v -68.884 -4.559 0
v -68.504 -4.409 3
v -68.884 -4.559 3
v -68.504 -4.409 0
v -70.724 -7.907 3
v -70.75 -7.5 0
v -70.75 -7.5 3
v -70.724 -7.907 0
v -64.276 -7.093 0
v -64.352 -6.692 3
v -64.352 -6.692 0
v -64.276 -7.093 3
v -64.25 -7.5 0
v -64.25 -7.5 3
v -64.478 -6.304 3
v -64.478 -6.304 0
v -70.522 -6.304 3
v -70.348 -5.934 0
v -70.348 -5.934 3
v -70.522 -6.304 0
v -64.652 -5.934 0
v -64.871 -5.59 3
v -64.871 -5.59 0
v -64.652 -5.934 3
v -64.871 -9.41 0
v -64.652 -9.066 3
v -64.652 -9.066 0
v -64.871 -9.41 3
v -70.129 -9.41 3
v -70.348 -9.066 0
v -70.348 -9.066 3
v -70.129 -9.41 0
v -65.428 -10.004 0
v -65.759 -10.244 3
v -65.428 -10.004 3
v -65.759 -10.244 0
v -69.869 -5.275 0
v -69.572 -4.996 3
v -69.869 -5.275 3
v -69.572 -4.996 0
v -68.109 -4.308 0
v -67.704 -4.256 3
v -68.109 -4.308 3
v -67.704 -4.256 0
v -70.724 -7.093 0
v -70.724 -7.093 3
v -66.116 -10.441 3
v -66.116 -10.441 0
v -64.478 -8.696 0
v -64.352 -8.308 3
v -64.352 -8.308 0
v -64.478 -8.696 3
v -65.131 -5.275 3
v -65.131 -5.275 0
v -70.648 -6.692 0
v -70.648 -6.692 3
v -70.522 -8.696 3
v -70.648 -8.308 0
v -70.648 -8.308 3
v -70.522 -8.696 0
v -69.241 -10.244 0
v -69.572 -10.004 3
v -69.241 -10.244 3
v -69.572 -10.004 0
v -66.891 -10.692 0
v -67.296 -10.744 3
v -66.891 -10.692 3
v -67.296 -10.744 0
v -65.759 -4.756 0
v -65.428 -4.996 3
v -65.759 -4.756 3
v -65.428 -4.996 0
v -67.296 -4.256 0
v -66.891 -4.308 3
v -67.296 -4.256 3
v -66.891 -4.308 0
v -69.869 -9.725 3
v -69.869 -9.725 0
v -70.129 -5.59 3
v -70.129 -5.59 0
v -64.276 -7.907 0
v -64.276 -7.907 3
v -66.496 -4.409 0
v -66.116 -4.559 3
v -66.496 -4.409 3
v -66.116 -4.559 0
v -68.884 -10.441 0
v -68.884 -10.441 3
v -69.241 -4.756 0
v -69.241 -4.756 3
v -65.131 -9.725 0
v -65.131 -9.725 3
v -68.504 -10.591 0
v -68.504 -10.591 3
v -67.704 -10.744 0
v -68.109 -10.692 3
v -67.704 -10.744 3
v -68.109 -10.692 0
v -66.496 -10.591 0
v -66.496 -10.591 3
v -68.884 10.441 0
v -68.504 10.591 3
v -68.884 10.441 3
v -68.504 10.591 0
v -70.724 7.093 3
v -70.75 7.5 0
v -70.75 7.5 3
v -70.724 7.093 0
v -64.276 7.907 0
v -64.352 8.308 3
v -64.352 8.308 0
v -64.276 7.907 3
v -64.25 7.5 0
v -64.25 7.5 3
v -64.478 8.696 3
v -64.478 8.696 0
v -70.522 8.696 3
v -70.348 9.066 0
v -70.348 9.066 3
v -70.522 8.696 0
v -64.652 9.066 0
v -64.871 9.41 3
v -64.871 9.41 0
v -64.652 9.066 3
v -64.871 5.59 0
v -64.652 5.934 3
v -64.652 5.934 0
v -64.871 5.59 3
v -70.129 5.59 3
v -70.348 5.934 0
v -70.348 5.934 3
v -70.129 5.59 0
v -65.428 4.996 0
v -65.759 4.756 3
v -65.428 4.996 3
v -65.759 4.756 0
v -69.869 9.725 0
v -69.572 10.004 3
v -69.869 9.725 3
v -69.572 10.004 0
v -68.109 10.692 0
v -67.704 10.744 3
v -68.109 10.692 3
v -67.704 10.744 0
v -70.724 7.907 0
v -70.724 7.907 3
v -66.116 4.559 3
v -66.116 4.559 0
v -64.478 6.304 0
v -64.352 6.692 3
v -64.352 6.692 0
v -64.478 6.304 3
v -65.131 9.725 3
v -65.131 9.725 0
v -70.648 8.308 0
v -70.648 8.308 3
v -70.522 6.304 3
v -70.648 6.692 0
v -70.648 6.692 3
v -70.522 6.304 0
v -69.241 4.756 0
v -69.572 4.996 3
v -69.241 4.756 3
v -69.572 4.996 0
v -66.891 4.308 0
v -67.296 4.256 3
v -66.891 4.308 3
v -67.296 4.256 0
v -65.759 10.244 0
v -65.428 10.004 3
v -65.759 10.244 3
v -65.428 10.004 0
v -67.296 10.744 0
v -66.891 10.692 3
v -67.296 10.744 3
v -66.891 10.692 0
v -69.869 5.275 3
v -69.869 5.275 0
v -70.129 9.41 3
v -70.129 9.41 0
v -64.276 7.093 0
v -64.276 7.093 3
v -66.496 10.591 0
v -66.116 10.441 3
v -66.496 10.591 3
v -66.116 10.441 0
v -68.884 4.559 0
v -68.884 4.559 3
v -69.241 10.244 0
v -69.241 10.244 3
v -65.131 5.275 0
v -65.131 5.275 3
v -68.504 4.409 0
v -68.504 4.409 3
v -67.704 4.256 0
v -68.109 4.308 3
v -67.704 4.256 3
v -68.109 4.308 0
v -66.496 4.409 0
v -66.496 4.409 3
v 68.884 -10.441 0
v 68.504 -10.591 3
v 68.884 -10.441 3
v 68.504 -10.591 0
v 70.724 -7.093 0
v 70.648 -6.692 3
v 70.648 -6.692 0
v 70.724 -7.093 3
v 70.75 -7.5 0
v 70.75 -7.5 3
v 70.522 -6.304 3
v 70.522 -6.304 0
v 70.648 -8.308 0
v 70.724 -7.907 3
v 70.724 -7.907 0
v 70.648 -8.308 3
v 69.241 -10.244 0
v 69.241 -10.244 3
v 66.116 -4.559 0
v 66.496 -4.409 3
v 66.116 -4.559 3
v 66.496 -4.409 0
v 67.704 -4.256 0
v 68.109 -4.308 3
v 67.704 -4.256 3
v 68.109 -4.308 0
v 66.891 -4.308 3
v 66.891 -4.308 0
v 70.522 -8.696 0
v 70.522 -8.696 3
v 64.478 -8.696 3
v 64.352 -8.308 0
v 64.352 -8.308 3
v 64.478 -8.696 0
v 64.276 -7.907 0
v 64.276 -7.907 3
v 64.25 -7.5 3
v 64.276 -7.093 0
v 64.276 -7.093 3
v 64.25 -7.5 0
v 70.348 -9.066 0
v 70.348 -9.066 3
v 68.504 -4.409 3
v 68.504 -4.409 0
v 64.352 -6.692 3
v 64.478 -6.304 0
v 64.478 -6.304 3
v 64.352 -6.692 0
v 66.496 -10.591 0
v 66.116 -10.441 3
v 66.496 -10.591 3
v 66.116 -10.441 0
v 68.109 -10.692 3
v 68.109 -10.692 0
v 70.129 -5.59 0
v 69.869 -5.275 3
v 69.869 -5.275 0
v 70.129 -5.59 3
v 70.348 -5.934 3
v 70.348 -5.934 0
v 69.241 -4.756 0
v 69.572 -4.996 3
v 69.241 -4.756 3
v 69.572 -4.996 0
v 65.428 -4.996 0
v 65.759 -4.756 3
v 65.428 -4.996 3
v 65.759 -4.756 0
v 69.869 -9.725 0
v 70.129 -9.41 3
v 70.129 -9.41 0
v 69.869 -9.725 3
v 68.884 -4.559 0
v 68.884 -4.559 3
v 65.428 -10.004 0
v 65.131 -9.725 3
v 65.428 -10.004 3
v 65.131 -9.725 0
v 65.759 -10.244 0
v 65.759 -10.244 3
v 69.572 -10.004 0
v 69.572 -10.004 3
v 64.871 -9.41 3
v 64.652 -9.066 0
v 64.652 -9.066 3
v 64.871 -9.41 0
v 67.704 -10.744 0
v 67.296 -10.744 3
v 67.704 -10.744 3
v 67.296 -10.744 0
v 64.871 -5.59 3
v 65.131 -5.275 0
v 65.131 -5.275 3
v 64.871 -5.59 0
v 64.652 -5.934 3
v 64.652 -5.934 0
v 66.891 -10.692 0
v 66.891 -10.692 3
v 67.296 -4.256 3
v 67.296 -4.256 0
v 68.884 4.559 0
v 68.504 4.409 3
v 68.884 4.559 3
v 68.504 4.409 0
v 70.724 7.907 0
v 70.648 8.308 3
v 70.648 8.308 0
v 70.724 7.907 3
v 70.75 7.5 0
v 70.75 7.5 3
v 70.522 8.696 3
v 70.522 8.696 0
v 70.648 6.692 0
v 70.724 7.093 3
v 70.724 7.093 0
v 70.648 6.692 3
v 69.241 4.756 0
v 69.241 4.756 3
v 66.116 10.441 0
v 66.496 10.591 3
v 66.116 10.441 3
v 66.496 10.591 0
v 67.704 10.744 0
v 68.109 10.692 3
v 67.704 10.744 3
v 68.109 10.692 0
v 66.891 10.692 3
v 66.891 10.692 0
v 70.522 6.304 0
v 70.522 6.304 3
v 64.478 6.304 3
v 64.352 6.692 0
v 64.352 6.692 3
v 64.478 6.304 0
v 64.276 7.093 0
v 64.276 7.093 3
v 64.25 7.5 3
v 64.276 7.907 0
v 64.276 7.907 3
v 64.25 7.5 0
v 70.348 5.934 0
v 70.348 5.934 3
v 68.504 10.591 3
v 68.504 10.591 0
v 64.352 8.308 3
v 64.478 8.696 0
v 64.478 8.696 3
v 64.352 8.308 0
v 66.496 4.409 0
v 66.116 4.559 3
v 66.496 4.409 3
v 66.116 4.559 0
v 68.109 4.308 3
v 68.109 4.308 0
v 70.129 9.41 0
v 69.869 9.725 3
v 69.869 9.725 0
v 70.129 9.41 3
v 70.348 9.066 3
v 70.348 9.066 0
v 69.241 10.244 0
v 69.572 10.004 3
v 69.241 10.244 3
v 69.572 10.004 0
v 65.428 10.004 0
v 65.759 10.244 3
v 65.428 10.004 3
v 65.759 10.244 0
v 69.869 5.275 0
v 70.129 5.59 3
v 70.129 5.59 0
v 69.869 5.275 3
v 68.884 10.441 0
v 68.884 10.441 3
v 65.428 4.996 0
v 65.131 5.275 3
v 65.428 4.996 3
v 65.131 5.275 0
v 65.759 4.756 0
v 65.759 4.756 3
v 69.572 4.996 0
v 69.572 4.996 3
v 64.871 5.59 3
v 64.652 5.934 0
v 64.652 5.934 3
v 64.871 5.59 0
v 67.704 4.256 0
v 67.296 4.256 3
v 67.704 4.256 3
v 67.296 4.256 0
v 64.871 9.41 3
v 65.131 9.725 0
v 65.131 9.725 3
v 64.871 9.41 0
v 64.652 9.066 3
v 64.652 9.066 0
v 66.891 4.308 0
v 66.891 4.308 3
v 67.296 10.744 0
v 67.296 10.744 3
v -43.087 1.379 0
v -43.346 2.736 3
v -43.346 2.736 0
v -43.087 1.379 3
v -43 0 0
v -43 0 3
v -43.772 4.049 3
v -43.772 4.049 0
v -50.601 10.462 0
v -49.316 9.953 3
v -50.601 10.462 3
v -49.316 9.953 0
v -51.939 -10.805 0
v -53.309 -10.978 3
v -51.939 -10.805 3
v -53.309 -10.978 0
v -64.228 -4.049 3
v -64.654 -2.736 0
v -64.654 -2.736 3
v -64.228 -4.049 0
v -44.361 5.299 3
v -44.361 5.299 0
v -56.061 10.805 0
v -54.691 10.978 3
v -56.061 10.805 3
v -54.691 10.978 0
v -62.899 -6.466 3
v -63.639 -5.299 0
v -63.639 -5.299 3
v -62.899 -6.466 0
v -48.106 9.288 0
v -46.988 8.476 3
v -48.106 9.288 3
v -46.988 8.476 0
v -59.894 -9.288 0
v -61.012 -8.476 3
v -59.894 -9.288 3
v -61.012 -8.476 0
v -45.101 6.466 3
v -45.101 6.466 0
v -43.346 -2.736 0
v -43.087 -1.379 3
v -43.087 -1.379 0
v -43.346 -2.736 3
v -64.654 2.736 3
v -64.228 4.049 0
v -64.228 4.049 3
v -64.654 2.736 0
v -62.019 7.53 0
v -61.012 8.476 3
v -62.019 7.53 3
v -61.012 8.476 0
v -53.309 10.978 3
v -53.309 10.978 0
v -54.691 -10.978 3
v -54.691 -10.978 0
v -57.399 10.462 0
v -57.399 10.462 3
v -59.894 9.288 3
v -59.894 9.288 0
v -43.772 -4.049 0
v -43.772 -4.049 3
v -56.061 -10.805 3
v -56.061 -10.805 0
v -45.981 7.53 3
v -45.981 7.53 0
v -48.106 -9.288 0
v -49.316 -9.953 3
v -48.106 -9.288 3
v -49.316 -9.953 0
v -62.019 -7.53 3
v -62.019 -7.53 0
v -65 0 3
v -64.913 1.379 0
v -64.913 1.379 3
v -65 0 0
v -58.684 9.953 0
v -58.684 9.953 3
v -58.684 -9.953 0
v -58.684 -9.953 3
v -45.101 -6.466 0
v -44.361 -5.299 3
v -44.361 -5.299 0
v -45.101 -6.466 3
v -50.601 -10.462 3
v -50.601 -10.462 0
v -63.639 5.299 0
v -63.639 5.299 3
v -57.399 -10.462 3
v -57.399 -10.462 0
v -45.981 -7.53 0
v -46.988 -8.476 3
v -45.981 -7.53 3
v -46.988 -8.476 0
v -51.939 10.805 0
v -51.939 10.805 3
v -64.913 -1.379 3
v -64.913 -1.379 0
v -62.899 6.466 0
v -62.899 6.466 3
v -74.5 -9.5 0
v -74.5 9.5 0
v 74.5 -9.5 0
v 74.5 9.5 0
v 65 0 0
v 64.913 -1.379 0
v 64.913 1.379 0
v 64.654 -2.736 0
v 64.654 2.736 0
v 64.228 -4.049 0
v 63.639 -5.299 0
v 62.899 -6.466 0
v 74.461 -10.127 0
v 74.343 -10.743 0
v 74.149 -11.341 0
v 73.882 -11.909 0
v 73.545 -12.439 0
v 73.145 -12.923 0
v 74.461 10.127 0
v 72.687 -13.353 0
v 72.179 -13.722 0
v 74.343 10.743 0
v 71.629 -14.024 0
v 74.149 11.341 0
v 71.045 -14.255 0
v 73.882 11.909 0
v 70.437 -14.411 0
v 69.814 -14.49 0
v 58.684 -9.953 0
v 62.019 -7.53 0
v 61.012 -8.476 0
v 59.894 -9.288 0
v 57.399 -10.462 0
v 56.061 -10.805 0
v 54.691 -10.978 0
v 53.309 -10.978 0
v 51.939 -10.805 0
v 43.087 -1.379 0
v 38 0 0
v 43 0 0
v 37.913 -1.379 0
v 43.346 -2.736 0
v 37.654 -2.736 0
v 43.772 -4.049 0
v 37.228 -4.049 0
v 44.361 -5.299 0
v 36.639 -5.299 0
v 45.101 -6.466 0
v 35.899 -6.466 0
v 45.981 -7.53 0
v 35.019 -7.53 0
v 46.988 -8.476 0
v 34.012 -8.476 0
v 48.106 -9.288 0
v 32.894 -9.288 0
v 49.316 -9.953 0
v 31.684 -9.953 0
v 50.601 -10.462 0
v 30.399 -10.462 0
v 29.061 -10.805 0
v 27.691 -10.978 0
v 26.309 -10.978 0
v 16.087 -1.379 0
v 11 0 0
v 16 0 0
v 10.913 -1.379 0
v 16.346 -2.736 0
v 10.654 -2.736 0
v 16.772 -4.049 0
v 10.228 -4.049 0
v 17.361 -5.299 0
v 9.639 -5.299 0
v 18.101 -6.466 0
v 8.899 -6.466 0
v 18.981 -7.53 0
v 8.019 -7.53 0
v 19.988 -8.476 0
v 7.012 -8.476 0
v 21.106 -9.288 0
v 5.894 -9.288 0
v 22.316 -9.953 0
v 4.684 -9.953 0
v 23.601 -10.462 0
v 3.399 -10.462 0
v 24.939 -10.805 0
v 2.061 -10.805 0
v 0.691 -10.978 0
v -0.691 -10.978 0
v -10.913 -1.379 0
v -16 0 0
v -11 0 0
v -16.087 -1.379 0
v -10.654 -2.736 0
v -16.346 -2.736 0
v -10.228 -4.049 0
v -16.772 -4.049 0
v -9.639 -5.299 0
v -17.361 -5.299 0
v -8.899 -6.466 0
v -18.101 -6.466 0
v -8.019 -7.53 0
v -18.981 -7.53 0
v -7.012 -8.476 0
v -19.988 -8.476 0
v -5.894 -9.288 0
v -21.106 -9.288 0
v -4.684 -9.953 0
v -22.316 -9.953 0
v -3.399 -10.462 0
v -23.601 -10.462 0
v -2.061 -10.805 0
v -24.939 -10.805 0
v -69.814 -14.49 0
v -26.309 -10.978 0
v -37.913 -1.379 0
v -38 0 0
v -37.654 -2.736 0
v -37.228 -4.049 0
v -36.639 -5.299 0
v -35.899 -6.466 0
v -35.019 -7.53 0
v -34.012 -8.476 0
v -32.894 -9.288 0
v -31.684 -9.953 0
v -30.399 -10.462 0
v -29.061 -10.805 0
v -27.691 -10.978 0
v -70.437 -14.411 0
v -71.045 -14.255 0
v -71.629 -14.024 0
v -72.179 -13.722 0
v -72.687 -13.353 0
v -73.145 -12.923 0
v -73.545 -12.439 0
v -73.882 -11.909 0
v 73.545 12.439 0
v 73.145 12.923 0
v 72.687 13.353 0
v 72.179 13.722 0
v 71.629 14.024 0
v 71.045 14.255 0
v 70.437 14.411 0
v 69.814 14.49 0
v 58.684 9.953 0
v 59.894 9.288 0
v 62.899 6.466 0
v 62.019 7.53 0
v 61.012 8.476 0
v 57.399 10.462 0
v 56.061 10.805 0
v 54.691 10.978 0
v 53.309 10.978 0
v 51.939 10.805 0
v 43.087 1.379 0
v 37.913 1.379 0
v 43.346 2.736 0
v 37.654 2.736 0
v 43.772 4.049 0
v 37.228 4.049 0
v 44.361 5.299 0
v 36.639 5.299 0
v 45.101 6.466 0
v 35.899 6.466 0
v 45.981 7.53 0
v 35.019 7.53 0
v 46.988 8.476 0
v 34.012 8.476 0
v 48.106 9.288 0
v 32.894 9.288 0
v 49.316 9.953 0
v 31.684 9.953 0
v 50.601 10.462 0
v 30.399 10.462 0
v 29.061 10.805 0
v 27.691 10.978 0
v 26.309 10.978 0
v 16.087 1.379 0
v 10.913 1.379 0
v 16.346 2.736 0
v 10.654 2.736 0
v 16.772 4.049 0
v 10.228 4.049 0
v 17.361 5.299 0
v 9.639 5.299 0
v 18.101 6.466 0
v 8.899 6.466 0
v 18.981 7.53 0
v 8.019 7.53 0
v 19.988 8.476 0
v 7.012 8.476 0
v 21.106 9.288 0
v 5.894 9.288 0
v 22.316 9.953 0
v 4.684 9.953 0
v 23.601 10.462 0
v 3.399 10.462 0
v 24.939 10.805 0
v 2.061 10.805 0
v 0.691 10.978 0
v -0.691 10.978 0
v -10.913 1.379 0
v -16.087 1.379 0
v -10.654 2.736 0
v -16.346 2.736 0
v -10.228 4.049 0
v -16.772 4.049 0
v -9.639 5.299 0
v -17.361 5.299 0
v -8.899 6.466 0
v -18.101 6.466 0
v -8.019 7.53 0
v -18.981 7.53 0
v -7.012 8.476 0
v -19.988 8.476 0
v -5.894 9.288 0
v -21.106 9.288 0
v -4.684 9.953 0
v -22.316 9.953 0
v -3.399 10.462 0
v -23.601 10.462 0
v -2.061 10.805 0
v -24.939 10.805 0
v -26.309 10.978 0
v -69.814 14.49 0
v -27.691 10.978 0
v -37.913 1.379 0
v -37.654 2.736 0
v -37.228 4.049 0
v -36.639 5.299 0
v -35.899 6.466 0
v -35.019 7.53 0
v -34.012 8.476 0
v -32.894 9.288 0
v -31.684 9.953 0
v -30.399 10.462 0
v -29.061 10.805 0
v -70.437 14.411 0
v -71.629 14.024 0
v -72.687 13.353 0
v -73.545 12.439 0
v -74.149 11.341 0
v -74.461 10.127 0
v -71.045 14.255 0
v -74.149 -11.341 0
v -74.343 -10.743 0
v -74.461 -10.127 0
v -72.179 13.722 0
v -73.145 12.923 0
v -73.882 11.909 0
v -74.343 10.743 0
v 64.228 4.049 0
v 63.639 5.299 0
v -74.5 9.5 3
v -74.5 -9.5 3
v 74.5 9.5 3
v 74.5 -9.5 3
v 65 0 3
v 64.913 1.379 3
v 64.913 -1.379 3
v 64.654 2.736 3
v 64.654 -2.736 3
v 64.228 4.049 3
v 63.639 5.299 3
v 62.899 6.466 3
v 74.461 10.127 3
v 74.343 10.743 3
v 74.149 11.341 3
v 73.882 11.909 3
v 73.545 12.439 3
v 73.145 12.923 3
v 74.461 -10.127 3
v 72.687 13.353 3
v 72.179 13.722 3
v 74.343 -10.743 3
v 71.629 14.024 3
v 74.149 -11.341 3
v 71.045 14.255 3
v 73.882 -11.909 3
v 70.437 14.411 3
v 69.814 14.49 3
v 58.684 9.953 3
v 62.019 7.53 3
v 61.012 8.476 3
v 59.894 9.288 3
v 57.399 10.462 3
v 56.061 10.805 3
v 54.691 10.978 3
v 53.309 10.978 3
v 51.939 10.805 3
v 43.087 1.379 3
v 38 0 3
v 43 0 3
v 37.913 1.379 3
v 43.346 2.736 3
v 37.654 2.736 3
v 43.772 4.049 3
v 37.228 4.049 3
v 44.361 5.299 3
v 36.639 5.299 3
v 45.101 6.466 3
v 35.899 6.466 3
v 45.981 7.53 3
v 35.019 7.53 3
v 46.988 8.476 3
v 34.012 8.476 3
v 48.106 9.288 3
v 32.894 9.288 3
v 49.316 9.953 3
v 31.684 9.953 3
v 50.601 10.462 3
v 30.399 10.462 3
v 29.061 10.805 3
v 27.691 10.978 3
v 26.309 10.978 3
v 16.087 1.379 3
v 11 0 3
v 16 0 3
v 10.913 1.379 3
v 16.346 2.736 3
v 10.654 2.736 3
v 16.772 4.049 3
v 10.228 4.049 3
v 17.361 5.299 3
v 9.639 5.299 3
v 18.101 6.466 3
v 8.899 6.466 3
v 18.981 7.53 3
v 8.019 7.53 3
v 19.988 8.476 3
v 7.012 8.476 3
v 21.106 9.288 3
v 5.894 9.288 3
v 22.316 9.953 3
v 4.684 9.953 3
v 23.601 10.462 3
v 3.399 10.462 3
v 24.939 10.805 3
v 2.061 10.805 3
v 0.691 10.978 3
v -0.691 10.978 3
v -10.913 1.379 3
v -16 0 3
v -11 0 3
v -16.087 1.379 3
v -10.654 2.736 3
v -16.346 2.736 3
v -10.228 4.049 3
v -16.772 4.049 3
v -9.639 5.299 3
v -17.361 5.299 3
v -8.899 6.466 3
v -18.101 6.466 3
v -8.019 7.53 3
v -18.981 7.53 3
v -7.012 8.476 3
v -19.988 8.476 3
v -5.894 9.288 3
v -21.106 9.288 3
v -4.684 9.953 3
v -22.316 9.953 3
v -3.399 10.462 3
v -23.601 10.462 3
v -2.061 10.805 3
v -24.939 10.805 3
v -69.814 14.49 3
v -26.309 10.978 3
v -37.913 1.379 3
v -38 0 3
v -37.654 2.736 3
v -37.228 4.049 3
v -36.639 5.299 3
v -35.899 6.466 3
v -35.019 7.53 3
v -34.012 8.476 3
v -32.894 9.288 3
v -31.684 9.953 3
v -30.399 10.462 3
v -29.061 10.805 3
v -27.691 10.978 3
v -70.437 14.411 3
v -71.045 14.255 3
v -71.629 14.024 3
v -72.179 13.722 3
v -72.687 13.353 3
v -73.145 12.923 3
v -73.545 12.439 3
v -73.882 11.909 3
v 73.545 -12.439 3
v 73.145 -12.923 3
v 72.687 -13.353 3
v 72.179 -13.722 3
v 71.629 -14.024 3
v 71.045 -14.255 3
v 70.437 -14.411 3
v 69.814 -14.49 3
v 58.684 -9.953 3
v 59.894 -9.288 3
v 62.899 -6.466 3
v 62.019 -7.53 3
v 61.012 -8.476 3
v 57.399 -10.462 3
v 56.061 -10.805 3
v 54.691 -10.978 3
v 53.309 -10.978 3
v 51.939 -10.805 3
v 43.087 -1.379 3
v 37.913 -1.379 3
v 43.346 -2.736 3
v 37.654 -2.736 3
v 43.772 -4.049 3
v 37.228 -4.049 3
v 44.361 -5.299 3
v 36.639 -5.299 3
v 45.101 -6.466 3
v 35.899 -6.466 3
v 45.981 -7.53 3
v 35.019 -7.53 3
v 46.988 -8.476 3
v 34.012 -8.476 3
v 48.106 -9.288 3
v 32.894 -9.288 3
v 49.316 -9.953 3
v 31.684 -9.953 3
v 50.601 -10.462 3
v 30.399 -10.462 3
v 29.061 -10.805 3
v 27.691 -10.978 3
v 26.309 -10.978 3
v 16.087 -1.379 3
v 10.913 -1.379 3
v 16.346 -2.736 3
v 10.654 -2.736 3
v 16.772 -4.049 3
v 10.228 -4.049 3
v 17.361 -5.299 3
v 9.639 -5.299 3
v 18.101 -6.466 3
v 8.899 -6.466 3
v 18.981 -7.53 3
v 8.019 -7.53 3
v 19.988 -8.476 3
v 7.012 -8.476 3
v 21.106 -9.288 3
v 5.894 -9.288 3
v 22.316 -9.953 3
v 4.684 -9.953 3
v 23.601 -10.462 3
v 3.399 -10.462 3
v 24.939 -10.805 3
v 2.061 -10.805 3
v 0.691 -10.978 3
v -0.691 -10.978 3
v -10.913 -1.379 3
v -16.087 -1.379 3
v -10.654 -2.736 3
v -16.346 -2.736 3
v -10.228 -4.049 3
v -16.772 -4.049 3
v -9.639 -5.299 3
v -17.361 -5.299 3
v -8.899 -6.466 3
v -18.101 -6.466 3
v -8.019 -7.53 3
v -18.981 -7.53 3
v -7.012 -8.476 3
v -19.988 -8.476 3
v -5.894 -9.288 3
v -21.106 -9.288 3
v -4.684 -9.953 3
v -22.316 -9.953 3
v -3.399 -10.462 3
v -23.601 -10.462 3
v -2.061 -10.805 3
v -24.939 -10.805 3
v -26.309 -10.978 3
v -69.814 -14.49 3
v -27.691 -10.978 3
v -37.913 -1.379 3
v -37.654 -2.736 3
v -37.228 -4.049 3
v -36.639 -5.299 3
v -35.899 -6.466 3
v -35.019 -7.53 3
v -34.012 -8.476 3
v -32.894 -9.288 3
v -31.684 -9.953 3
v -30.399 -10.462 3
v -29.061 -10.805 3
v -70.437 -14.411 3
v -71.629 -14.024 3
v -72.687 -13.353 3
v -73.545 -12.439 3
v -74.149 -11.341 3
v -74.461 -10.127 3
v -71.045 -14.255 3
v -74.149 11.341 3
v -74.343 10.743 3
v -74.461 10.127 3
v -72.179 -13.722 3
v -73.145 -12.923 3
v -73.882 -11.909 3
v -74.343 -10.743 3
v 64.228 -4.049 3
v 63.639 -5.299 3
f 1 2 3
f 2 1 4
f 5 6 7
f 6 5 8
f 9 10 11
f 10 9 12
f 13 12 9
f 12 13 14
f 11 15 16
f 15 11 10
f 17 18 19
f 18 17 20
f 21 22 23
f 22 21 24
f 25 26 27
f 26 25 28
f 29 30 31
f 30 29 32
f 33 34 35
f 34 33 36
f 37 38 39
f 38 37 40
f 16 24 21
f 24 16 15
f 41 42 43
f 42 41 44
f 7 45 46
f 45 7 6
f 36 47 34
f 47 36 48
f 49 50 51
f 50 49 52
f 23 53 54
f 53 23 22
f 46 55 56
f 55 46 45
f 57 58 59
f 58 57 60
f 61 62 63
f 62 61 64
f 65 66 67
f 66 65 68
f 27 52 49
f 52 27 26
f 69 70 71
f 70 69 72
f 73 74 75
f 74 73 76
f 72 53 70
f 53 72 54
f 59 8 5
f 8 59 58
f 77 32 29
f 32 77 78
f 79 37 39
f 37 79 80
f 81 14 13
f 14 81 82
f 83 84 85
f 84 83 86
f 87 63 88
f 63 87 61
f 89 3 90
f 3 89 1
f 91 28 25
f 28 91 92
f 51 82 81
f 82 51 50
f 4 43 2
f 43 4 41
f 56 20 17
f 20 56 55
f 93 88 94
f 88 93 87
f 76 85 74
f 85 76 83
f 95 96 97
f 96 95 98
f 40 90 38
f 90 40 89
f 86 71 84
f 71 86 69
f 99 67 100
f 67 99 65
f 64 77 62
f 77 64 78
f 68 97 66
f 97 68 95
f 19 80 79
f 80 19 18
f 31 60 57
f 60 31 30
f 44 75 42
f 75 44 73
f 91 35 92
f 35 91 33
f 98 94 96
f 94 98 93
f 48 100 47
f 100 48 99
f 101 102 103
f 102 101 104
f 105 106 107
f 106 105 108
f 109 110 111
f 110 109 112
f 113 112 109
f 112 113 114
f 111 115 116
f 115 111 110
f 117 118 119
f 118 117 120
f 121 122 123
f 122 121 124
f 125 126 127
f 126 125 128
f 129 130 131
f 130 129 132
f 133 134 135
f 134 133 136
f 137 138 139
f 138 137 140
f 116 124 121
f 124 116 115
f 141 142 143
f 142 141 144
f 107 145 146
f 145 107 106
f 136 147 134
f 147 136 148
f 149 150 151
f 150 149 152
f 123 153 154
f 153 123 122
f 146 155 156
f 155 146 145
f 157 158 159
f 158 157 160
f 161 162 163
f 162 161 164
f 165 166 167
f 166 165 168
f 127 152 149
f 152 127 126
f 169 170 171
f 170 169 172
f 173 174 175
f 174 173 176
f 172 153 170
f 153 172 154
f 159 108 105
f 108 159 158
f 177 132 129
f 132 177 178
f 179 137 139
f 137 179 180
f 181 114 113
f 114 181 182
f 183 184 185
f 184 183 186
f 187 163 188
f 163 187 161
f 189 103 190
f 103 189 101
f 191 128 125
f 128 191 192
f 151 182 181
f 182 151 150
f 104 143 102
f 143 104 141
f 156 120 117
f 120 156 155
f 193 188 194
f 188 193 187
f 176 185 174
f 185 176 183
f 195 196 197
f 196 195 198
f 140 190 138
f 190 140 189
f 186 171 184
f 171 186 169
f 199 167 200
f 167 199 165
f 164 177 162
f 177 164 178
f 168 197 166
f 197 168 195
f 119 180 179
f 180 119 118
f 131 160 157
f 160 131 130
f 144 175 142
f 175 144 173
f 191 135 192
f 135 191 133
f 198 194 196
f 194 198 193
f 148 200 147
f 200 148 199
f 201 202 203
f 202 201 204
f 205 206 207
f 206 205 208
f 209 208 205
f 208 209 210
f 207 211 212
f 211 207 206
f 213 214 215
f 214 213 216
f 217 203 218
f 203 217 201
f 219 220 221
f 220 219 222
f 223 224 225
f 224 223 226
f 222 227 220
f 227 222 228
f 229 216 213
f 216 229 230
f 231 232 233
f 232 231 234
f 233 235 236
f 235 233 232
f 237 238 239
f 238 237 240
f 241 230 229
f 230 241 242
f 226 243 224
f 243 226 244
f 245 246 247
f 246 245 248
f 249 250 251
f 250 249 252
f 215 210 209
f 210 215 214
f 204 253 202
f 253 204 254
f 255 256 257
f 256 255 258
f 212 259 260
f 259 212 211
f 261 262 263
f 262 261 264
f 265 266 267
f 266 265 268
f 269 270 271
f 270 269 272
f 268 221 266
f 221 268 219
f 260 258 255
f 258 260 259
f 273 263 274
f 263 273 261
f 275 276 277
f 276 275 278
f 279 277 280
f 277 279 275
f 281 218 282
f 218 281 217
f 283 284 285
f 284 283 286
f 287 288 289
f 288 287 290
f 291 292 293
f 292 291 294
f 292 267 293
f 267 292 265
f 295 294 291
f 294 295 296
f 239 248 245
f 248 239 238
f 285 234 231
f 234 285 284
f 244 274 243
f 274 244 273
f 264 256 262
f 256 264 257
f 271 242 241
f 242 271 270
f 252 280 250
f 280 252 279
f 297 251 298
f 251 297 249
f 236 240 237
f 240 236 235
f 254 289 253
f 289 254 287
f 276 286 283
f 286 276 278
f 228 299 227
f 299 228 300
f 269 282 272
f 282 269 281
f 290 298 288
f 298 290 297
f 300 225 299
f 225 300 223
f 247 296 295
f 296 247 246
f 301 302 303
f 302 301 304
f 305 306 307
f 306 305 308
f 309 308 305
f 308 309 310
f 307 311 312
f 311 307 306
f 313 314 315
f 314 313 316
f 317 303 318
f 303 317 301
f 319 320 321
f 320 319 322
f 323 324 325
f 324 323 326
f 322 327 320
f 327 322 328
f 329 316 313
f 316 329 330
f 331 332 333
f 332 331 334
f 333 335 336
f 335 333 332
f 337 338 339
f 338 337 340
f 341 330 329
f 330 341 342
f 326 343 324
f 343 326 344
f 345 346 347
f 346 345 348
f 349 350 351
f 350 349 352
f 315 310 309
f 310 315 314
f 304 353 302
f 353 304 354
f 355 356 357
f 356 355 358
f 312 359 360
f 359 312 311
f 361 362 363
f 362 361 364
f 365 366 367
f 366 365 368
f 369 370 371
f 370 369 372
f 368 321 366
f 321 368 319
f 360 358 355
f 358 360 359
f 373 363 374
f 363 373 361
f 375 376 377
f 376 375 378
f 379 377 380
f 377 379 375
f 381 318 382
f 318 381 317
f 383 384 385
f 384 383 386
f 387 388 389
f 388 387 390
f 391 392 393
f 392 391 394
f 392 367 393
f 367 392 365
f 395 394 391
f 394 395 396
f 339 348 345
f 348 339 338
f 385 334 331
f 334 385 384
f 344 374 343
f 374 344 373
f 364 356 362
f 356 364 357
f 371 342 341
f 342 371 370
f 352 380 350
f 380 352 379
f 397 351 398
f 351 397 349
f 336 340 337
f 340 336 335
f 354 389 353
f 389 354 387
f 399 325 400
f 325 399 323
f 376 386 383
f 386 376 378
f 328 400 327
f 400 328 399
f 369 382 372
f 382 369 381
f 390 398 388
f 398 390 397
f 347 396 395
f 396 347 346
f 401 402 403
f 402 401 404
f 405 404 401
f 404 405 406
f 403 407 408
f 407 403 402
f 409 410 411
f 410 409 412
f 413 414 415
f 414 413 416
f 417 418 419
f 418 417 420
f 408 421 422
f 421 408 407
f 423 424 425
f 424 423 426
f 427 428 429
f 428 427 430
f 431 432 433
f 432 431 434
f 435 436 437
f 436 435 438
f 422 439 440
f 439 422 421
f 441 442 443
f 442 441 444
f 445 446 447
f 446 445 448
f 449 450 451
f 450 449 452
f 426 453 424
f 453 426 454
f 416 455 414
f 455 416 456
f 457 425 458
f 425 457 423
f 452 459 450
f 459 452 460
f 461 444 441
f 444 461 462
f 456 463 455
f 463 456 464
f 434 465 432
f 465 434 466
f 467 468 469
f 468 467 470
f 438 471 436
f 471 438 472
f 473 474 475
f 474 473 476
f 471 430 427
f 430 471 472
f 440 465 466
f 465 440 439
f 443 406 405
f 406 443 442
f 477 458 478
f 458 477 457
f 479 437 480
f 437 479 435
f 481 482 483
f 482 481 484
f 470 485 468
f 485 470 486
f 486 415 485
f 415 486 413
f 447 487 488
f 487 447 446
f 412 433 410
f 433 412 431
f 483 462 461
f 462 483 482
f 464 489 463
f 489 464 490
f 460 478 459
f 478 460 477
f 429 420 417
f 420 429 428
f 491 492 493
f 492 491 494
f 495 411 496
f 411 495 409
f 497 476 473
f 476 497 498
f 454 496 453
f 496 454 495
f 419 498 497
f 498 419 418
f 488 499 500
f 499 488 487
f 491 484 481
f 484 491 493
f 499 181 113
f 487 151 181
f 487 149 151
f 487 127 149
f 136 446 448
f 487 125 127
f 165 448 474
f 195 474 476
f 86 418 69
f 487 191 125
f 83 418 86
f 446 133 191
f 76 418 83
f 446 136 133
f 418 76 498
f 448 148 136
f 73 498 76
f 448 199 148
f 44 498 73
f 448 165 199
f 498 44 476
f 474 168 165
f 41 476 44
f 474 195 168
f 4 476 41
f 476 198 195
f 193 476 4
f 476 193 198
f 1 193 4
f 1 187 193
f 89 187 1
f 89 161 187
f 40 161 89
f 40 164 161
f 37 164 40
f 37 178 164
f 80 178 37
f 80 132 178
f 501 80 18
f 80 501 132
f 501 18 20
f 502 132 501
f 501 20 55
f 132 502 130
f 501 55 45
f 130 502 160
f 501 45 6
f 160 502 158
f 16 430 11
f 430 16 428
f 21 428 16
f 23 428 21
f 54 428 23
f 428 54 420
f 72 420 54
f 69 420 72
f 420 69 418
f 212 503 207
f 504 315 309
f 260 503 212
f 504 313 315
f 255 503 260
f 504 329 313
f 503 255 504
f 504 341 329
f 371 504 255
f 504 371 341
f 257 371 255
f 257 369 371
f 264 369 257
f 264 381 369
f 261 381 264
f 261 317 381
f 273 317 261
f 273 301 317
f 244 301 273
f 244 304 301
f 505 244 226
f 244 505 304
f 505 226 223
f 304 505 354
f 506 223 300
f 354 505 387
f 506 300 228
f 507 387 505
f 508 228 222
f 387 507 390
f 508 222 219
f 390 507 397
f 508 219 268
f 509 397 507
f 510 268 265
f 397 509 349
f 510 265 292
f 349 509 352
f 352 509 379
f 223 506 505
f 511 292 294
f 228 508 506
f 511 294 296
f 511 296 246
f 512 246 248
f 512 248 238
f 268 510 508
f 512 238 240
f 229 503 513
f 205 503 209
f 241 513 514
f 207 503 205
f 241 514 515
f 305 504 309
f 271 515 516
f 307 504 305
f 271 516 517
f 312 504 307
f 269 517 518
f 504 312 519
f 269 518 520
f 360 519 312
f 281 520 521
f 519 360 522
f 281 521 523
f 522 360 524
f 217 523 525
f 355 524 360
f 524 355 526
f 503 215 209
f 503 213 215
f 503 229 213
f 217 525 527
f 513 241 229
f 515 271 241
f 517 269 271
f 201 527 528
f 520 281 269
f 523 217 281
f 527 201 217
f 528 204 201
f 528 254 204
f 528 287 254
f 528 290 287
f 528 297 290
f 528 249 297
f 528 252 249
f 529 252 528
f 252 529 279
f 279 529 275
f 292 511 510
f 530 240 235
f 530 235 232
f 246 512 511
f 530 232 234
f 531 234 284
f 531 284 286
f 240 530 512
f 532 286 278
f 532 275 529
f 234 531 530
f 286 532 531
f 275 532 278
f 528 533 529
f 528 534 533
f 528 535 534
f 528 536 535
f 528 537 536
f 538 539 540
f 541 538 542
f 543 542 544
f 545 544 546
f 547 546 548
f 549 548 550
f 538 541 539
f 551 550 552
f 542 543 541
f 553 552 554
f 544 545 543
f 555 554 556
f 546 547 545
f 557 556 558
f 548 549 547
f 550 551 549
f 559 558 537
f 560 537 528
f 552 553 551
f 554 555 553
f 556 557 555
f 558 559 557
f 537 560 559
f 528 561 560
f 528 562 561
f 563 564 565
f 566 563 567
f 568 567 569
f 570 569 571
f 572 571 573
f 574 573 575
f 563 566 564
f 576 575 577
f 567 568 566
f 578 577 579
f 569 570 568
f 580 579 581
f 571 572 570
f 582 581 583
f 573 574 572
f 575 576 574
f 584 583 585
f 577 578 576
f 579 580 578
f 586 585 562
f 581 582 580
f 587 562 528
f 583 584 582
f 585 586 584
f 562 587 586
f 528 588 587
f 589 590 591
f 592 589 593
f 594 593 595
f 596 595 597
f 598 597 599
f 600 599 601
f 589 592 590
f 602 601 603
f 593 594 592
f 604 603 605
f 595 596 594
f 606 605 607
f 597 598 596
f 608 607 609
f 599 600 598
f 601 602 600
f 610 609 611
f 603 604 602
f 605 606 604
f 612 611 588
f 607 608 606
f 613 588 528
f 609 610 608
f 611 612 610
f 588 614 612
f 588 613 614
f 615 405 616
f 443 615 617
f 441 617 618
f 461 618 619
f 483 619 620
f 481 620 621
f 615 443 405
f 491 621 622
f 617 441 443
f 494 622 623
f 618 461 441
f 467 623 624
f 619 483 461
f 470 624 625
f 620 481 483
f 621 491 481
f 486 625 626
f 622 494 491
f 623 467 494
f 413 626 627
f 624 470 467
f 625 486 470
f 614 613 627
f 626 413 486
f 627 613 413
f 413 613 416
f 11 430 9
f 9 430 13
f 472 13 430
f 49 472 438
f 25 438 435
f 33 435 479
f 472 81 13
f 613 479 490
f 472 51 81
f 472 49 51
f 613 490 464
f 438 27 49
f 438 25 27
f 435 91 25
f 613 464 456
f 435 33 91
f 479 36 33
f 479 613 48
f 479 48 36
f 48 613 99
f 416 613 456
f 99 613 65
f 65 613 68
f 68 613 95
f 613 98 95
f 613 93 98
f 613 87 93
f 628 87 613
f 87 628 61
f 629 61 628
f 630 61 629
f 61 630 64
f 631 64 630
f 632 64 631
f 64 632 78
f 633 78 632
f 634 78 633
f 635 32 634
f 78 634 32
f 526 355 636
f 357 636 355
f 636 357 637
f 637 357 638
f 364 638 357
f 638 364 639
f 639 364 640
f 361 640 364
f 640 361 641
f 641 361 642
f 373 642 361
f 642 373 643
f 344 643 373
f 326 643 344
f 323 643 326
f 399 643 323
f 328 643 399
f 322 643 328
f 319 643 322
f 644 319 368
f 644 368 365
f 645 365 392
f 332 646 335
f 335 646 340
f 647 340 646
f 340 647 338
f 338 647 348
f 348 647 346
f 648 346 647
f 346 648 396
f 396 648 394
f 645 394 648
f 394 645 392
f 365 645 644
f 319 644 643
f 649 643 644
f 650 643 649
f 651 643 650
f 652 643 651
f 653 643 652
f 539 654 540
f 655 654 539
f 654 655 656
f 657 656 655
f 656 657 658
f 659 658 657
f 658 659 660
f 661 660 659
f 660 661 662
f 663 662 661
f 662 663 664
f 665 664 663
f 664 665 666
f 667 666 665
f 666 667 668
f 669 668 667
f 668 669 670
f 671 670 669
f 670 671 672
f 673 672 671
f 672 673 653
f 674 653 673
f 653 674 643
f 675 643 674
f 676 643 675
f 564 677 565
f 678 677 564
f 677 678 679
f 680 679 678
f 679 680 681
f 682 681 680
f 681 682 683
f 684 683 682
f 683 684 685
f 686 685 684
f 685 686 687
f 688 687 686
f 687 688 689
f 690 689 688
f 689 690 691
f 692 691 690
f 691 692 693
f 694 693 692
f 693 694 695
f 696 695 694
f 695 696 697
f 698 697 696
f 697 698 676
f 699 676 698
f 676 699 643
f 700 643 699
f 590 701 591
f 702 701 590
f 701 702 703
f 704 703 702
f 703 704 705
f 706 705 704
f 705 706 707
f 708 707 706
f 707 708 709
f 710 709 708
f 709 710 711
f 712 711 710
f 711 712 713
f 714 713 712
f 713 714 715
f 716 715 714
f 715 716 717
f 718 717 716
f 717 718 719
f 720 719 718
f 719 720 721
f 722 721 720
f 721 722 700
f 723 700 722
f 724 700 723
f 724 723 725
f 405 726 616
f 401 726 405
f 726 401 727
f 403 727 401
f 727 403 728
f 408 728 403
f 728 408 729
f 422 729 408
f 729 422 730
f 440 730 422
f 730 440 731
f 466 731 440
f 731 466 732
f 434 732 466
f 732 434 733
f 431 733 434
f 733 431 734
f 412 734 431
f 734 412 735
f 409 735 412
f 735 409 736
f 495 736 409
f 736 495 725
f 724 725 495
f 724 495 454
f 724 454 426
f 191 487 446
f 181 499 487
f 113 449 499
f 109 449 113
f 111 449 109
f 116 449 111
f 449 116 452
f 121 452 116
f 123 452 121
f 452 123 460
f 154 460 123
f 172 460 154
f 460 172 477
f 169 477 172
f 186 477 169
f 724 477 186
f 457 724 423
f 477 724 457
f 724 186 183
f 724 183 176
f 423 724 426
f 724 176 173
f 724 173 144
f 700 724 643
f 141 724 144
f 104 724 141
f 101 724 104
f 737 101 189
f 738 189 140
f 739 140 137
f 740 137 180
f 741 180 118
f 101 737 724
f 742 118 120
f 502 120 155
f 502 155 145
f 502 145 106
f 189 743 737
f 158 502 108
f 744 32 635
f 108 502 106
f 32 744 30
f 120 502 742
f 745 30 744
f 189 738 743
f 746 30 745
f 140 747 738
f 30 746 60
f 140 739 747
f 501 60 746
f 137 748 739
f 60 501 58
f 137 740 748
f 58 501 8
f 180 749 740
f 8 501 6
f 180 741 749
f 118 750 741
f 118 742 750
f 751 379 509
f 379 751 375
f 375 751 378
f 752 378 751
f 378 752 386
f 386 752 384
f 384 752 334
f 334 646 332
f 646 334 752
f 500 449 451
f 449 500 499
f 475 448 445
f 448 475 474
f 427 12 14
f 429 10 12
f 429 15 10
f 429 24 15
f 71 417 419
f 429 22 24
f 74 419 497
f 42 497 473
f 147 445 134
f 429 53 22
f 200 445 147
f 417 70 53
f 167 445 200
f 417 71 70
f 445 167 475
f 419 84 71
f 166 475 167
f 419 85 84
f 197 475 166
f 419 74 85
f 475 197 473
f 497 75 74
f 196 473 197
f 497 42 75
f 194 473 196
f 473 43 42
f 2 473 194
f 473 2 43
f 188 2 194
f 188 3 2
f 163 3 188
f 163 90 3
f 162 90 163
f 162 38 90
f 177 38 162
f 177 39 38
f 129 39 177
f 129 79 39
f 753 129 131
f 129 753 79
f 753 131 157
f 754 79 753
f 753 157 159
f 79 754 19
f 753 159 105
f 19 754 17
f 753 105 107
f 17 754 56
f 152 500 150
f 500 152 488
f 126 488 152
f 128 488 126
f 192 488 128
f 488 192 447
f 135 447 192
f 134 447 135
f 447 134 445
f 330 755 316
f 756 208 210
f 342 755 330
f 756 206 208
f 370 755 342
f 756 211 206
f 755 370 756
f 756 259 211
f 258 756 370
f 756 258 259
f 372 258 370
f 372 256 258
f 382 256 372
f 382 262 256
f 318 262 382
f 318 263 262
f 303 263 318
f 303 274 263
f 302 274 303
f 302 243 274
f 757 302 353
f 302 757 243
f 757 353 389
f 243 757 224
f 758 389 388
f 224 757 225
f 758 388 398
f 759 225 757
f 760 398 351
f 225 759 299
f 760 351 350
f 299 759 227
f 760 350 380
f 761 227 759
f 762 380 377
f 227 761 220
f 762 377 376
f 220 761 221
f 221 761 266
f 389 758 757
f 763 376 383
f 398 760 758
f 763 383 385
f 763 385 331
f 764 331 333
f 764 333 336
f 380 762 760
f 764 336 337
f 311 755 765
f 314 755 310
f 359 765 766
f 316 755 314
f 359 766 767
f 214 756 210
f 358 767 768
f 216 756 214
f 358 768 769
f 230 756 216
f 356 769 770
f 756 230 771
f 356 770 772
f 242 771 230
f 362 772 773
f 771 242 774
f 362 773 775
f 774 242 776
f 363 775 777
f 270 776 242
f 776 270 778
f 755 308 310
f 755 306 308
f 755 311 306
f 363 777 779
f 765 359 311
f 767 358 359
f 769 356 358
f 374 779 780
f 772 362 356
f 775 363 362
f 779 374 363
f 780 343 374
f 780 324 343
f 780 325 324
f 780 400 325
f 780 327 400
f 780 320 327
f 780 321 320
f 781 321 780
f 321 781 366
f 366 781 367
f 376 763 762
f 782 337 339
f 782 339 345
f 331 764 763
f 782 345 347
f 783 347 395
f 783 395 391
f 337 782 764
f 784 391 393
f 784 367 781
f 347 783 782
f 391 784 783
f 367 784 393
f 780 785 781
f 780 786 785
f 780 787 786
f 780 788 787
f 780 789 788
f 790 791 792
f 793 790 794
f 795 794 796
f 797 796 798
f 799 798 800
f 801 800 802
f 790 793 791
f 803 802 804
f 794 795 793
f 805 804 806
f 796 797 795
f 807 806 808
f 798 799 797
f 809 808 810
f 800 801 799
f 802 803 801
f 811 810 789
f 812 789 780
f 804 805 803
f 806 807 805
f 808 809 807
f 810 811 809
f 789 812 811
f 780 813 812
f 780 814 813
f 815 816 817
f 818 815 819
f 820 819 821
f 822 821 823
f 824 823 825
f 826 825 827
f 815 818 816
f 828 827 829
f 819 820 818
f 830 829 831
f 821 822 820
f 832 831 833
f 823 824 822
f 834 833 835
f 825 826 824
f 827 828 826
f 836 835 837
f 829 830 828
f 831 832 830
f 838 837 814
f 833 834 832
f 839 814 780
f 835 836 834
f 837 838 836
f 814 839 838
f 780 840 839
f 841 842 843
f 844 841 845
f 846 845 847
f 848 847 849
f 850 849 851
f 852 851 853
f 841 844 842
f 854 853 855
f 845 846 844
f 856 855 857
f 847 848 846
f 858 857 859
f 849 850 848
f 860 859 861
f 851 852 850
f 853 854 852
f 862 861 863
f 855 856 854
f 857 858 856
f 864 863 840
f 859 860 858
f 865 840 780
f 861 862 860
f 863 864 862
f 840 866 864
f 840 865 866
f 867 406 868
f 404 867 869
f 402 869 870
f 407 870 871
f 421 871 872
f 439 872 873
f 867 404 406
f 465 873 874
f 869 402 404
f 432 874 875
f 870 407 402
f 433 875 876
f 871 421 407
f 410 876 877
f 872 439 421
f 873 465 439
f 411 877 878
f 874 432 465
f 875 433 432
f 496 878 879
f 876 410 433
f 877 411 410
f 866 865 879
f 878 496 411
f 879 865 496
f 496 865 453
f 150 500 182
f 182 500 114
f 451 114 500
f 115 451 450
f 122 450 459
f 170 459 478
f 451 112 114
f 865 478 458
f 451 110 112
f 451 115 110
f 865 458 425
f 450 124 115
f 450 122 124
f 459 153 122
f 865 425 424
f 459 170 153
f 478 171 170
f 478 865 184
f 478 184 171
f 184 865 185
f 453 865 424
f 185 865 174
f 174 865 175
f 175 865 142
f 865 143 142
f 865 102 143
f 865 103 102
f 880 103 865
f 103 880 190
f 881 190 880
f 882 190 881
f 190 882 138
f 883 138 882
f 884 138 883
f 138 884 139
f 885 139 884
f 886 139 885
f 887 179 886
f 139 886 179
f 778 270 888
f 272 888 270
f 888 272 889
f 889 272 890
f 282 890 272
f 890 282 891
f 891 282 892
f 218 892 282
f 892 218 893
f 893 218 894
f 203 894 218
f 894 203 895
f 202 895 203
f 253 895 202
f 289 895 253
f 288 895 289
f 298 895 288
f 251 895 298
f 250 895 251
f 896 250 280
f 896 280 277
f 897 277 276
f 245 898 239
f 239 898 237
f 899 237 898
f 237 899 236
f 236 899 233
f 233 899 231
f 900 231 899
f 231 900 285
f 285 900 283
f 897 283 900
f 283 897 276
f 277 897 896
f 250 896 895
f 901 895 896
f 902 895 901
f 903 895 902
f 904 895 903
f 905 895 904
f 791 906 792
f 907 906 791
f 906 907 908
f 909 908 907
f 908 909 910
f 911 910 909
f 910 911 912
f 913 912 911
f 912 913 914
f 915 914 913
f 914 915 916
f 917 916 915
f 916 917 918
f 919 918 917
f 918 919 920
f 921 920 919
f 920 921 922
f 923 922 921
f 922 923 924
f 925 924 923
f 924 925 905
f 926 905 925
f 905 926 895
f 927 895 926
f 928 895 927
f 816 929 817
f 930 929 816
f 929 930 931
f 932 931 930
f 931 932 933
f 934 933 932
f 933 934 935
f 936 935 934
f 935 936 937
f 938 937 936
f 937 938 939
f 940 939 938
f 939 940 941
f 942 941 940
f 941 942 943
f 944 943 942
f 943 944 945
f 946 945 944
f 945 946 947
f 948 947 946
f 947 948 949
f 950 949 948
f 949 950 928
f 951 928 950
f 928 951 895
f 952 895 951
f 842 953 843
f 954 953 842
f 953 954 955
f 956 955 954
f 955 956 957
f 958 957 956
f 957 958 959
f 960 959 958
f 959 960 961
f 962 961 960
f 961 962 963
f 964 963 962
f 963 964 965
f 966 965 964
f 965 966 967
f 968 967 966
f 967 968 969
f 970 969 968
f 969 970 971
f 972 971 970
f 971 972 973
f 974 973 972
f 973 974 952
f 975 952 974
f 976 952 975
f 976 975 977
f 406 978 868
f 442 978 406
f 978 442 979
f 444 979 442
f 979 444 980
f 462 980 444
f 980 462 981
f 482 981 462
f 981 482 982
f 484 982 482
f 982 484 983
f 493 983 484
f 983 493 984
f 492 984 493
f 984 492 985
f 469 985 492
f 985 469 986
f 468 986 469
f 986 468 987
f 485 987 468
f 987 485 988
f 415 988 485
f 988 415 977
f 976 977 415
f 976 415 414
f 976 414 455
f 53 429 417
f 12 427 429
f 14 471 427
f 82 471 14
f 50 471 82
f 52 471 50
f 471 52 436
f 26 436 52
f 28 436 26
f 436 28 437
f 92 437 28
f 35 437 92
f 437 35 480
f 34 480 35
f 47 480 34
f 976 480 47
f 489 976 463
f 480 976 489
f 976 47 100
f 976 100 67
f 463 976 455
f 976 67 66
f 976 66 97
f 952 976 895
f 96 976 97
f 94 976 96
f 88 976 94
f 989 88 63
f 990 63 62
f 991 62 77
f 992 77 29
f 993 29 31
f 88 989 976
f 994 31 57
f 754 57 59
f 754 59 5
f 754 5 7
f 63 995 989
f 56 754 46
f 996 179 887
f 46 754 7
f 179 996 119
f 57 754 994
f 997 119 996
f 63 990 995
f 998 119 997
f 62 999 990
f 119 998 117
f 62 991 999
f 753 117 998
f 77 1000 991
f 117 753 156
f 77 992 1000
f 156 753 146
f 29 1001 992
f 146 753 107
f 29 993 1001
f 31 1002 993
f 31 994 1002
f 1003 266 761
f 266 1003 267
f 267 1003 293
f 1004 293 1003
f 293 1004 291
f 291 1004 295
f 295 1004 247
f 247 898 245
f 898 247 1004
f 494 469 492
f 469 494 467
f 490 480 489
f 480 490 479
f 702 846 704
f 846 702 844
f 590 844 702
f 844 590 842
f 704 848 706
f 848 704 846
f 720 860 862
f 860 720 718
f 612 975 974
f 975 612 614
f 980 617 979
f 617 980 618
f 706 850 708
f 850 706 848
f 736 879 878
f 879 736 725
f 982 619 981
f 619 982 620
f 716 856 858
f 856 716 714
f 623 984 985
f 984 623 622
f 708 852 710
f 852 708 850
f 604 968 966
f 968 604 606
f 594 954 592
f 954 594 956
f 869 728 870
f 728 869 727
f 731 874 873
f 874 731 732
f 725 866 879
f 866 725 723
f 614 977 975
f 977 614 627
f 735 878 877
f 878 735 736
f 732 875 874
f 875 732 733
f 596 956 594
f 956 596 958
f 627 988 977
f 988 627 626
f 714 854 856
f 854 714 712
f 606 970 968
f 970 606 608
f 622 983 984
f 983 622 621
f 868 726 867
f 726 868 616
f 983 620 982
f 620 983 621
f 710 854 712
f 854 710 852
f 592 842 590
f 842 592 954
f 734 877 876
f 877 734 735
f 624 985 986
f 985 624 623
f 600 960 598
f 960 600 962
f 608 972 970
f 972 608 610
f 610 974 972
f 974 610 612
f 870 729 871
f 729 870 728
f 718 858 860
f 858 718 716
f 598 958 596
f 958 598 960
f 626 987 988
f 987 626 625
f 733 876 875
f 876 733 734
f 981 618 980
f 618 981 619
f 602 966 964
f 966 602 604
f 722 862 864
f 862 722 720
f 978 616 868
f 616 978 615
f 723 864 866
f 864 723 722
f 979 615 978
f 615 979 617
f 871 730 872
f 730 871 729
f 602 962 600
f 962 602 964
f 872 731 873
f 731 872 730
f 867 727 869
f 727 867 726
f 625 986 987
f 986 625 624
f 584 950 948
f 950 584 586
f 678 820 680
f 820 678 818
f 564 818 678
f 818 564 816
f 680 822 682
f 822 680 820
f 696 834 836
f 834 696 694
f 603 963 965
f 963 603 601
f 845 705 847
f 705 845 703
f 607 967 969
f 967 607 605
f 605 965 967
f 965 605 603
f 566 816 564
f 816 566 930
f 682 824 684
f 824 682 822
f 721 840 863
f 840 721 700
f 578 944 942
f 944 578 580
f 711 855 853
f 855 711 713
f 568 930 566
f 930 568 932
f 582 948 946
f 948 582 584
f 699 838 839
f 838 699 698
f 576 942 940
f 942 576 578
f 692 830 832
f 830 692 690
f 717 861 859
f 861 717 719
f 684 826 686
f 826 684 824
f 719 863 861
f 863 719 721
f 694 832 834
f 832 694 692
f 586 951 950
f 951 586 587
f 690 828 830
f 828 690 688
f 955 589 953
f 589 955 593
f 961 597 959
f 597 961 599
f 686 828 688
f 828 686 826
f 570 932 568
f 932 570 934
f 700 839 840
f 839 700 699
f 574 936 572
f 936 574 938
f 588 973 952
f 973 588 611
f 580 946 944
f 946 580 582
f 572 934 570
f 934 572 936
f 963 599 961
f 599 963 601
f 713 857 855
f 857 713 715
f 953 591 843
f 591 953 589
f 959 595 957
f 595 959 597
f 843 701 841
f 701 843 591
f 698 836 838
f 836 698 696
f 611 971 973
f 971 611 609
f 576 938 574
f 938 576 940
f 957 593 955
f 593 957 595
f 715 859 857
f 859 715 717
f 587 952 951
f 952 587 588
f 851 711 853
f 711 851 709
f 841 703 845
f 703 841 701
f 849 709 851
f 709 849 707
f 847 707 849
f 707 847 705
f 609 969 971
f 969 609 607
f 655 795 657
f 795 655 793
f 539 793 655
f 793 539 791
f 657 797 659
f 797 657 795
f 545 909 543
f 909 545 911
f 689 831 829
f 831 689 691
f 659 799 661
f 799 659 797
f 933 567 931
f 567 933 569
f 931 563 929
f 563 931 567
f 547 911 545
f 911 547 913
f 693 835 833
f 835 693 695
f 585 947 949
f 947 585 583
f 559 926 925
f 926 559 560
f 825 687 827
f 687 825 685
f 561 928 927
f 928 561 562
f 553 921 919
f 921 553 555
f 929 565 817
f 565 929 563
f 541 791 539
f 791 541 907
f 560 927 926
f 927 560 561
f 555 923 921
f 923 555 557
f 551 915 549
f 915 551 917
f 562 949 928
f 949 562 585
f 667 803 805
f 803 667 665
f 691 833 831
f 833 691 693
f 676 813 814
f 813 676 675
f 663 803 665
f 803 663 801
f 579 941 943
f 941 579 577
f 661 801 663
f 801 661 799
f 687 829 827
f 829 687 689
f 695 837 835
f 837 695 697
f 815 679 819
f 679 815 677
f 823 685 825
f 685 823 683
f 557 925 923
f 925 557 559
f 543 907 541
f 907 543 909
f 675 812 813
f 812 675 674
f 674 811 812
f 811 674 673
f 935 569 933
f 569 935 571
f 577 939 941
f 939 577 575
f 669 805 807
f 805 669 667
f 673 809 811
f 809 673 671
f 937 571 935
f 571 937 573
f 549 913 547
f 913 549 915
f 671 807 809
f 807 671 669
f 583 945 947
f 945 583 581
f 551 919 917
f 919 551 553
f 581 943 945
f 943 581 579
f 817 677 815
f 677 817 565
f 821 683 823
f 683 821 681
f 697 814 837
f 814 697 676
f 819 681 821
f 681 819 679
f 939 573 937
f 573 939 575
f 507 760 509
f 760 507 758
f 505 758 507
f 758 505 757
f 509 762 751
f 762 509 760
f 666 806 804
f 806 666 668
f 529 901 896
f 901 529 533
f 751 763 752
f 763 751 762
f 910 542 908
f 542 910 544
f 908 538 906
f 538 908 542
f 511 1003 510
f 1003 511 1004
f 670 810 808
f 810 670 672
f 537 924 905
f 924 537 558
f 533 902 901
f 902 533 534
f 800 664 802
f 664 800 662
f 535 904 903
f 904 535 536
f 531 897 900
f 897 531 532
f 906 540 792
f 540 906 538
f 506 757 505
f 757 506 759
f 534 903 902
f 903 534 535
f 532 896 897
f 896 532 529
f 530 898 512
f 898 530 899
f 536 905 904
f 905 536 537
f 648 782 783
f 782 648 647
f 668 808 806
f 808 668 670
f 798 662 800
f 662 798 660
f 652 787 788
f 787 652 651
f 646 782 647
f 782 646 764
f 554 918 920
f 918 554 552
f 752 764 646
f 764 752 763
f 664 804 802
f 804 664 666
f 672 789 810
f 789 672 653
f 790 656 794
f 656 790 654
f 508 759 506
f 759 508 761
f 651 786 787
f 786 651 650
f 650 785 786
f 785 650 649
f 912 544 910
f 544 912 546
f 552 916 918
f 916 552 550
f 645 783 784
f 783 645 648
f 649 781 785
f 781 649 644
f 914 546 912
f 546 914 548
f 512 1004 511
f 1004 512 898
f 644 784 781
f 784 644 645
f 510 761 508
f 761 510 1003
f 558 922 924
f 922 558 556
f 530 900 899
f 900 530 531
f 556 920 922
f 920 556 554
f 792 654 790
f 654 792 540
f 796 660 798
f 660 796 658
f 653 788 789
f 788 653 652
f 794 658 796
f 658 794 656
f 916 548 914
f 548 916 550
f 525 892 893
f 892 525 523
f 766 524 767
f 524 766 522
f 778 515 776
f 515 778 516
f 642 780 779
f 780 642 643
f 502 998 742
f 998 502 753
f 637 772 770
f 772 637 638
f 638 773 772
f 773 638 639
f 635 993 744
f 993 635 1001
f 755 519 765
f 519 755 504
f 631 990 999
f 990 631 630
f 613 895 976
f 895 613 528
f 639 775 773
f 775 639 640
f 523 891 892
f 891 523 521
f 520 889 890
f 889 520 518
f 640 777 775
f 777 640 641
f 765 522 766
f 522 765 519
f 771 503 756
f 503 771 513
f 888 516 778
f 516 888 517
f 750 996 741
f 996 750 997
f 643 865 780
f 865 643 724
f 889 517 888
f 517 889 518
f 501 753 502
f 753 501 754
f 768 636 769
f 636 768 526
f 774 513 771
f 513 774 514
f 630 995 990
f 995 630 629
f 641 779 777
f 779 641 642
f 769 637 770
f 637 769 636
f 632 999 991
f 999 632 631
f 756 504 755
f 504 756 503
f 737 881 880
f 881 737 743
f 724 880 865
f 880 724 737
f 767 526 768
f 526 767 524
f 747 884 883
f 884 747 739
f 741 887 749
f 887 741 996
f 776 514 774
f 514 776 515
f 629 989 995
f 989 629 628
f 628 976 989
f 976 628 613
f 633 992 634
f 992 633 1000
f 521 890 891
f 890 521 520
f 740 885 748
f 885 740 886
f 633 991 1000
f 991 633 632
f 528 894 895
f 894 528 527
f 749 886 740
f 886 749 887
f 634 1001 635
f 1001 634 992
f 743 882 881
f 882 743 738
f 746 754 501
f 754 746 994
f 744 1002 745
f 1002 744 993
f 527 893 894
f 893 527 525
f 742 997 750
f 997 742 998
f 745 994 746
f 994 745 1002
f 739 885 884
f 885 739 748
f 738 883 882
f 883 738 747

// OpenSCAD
$fn = 50;


difference() {
	union() {
		hull() {
			translate(v = [-69.5000000000, 9.5000000000, 0]) {
				cylinder(h = 3, r = 5);
			}
			translate(v = [69.5000000000, 9.5000000000, 0]) {
				cylinder(h = 3, r = 5);
			}
			translate(v = [-69.5000000000, -9.5000000000, 0]) {
				cylinder(h = 3, r = 5);
			}
			translate(v = [69.5000000000, -9.5000000000, 0]) {
				cylinder(h = 3, r = 5);
			}
		}
	}
	union() {
		#translate(v = [-67.5000000000, -7.5000000000, -100.0000000000]) {
			cylinder(h = 200, r = 3.2500000000);
		}
		#translate(v = [-67.5000000000, 7.5000000000, -100.0000000000]) {
			cylinder(h = 200, r = 3.2500000000);
		}
		#translate(v = [67.5000000000, -7.5000000000, -100.0000000000]) {
			cylinder(h = 200, r = 3.2500000000);
		}
		#translate(v = [67.5000000000, 7.5000000000, -100.0000000000]) {
			cylinder(h = 200, r = 3.2500000000);
		}
		#translate(v = [-54.0000000000, 0, 0]) {
			cylinder(h = 3, r = 11.0000000000);
		}
		#translate(v = [-27.0000000000, 0, 0]) {
			cylinder(h = 3, r = 11.0000000000);
		}
		#cylinder(h = 3, r = 11.0000000000);
		#translate(v = [27.0000000000, 0, 0]) {
			cylinder(h = 3, r = 11.0000000000);
		}
		#translate(v = [54.0000000000, 0, 0]) {
			cylinder(h = 3, r = 11.0000000000);
		}
	}
}
